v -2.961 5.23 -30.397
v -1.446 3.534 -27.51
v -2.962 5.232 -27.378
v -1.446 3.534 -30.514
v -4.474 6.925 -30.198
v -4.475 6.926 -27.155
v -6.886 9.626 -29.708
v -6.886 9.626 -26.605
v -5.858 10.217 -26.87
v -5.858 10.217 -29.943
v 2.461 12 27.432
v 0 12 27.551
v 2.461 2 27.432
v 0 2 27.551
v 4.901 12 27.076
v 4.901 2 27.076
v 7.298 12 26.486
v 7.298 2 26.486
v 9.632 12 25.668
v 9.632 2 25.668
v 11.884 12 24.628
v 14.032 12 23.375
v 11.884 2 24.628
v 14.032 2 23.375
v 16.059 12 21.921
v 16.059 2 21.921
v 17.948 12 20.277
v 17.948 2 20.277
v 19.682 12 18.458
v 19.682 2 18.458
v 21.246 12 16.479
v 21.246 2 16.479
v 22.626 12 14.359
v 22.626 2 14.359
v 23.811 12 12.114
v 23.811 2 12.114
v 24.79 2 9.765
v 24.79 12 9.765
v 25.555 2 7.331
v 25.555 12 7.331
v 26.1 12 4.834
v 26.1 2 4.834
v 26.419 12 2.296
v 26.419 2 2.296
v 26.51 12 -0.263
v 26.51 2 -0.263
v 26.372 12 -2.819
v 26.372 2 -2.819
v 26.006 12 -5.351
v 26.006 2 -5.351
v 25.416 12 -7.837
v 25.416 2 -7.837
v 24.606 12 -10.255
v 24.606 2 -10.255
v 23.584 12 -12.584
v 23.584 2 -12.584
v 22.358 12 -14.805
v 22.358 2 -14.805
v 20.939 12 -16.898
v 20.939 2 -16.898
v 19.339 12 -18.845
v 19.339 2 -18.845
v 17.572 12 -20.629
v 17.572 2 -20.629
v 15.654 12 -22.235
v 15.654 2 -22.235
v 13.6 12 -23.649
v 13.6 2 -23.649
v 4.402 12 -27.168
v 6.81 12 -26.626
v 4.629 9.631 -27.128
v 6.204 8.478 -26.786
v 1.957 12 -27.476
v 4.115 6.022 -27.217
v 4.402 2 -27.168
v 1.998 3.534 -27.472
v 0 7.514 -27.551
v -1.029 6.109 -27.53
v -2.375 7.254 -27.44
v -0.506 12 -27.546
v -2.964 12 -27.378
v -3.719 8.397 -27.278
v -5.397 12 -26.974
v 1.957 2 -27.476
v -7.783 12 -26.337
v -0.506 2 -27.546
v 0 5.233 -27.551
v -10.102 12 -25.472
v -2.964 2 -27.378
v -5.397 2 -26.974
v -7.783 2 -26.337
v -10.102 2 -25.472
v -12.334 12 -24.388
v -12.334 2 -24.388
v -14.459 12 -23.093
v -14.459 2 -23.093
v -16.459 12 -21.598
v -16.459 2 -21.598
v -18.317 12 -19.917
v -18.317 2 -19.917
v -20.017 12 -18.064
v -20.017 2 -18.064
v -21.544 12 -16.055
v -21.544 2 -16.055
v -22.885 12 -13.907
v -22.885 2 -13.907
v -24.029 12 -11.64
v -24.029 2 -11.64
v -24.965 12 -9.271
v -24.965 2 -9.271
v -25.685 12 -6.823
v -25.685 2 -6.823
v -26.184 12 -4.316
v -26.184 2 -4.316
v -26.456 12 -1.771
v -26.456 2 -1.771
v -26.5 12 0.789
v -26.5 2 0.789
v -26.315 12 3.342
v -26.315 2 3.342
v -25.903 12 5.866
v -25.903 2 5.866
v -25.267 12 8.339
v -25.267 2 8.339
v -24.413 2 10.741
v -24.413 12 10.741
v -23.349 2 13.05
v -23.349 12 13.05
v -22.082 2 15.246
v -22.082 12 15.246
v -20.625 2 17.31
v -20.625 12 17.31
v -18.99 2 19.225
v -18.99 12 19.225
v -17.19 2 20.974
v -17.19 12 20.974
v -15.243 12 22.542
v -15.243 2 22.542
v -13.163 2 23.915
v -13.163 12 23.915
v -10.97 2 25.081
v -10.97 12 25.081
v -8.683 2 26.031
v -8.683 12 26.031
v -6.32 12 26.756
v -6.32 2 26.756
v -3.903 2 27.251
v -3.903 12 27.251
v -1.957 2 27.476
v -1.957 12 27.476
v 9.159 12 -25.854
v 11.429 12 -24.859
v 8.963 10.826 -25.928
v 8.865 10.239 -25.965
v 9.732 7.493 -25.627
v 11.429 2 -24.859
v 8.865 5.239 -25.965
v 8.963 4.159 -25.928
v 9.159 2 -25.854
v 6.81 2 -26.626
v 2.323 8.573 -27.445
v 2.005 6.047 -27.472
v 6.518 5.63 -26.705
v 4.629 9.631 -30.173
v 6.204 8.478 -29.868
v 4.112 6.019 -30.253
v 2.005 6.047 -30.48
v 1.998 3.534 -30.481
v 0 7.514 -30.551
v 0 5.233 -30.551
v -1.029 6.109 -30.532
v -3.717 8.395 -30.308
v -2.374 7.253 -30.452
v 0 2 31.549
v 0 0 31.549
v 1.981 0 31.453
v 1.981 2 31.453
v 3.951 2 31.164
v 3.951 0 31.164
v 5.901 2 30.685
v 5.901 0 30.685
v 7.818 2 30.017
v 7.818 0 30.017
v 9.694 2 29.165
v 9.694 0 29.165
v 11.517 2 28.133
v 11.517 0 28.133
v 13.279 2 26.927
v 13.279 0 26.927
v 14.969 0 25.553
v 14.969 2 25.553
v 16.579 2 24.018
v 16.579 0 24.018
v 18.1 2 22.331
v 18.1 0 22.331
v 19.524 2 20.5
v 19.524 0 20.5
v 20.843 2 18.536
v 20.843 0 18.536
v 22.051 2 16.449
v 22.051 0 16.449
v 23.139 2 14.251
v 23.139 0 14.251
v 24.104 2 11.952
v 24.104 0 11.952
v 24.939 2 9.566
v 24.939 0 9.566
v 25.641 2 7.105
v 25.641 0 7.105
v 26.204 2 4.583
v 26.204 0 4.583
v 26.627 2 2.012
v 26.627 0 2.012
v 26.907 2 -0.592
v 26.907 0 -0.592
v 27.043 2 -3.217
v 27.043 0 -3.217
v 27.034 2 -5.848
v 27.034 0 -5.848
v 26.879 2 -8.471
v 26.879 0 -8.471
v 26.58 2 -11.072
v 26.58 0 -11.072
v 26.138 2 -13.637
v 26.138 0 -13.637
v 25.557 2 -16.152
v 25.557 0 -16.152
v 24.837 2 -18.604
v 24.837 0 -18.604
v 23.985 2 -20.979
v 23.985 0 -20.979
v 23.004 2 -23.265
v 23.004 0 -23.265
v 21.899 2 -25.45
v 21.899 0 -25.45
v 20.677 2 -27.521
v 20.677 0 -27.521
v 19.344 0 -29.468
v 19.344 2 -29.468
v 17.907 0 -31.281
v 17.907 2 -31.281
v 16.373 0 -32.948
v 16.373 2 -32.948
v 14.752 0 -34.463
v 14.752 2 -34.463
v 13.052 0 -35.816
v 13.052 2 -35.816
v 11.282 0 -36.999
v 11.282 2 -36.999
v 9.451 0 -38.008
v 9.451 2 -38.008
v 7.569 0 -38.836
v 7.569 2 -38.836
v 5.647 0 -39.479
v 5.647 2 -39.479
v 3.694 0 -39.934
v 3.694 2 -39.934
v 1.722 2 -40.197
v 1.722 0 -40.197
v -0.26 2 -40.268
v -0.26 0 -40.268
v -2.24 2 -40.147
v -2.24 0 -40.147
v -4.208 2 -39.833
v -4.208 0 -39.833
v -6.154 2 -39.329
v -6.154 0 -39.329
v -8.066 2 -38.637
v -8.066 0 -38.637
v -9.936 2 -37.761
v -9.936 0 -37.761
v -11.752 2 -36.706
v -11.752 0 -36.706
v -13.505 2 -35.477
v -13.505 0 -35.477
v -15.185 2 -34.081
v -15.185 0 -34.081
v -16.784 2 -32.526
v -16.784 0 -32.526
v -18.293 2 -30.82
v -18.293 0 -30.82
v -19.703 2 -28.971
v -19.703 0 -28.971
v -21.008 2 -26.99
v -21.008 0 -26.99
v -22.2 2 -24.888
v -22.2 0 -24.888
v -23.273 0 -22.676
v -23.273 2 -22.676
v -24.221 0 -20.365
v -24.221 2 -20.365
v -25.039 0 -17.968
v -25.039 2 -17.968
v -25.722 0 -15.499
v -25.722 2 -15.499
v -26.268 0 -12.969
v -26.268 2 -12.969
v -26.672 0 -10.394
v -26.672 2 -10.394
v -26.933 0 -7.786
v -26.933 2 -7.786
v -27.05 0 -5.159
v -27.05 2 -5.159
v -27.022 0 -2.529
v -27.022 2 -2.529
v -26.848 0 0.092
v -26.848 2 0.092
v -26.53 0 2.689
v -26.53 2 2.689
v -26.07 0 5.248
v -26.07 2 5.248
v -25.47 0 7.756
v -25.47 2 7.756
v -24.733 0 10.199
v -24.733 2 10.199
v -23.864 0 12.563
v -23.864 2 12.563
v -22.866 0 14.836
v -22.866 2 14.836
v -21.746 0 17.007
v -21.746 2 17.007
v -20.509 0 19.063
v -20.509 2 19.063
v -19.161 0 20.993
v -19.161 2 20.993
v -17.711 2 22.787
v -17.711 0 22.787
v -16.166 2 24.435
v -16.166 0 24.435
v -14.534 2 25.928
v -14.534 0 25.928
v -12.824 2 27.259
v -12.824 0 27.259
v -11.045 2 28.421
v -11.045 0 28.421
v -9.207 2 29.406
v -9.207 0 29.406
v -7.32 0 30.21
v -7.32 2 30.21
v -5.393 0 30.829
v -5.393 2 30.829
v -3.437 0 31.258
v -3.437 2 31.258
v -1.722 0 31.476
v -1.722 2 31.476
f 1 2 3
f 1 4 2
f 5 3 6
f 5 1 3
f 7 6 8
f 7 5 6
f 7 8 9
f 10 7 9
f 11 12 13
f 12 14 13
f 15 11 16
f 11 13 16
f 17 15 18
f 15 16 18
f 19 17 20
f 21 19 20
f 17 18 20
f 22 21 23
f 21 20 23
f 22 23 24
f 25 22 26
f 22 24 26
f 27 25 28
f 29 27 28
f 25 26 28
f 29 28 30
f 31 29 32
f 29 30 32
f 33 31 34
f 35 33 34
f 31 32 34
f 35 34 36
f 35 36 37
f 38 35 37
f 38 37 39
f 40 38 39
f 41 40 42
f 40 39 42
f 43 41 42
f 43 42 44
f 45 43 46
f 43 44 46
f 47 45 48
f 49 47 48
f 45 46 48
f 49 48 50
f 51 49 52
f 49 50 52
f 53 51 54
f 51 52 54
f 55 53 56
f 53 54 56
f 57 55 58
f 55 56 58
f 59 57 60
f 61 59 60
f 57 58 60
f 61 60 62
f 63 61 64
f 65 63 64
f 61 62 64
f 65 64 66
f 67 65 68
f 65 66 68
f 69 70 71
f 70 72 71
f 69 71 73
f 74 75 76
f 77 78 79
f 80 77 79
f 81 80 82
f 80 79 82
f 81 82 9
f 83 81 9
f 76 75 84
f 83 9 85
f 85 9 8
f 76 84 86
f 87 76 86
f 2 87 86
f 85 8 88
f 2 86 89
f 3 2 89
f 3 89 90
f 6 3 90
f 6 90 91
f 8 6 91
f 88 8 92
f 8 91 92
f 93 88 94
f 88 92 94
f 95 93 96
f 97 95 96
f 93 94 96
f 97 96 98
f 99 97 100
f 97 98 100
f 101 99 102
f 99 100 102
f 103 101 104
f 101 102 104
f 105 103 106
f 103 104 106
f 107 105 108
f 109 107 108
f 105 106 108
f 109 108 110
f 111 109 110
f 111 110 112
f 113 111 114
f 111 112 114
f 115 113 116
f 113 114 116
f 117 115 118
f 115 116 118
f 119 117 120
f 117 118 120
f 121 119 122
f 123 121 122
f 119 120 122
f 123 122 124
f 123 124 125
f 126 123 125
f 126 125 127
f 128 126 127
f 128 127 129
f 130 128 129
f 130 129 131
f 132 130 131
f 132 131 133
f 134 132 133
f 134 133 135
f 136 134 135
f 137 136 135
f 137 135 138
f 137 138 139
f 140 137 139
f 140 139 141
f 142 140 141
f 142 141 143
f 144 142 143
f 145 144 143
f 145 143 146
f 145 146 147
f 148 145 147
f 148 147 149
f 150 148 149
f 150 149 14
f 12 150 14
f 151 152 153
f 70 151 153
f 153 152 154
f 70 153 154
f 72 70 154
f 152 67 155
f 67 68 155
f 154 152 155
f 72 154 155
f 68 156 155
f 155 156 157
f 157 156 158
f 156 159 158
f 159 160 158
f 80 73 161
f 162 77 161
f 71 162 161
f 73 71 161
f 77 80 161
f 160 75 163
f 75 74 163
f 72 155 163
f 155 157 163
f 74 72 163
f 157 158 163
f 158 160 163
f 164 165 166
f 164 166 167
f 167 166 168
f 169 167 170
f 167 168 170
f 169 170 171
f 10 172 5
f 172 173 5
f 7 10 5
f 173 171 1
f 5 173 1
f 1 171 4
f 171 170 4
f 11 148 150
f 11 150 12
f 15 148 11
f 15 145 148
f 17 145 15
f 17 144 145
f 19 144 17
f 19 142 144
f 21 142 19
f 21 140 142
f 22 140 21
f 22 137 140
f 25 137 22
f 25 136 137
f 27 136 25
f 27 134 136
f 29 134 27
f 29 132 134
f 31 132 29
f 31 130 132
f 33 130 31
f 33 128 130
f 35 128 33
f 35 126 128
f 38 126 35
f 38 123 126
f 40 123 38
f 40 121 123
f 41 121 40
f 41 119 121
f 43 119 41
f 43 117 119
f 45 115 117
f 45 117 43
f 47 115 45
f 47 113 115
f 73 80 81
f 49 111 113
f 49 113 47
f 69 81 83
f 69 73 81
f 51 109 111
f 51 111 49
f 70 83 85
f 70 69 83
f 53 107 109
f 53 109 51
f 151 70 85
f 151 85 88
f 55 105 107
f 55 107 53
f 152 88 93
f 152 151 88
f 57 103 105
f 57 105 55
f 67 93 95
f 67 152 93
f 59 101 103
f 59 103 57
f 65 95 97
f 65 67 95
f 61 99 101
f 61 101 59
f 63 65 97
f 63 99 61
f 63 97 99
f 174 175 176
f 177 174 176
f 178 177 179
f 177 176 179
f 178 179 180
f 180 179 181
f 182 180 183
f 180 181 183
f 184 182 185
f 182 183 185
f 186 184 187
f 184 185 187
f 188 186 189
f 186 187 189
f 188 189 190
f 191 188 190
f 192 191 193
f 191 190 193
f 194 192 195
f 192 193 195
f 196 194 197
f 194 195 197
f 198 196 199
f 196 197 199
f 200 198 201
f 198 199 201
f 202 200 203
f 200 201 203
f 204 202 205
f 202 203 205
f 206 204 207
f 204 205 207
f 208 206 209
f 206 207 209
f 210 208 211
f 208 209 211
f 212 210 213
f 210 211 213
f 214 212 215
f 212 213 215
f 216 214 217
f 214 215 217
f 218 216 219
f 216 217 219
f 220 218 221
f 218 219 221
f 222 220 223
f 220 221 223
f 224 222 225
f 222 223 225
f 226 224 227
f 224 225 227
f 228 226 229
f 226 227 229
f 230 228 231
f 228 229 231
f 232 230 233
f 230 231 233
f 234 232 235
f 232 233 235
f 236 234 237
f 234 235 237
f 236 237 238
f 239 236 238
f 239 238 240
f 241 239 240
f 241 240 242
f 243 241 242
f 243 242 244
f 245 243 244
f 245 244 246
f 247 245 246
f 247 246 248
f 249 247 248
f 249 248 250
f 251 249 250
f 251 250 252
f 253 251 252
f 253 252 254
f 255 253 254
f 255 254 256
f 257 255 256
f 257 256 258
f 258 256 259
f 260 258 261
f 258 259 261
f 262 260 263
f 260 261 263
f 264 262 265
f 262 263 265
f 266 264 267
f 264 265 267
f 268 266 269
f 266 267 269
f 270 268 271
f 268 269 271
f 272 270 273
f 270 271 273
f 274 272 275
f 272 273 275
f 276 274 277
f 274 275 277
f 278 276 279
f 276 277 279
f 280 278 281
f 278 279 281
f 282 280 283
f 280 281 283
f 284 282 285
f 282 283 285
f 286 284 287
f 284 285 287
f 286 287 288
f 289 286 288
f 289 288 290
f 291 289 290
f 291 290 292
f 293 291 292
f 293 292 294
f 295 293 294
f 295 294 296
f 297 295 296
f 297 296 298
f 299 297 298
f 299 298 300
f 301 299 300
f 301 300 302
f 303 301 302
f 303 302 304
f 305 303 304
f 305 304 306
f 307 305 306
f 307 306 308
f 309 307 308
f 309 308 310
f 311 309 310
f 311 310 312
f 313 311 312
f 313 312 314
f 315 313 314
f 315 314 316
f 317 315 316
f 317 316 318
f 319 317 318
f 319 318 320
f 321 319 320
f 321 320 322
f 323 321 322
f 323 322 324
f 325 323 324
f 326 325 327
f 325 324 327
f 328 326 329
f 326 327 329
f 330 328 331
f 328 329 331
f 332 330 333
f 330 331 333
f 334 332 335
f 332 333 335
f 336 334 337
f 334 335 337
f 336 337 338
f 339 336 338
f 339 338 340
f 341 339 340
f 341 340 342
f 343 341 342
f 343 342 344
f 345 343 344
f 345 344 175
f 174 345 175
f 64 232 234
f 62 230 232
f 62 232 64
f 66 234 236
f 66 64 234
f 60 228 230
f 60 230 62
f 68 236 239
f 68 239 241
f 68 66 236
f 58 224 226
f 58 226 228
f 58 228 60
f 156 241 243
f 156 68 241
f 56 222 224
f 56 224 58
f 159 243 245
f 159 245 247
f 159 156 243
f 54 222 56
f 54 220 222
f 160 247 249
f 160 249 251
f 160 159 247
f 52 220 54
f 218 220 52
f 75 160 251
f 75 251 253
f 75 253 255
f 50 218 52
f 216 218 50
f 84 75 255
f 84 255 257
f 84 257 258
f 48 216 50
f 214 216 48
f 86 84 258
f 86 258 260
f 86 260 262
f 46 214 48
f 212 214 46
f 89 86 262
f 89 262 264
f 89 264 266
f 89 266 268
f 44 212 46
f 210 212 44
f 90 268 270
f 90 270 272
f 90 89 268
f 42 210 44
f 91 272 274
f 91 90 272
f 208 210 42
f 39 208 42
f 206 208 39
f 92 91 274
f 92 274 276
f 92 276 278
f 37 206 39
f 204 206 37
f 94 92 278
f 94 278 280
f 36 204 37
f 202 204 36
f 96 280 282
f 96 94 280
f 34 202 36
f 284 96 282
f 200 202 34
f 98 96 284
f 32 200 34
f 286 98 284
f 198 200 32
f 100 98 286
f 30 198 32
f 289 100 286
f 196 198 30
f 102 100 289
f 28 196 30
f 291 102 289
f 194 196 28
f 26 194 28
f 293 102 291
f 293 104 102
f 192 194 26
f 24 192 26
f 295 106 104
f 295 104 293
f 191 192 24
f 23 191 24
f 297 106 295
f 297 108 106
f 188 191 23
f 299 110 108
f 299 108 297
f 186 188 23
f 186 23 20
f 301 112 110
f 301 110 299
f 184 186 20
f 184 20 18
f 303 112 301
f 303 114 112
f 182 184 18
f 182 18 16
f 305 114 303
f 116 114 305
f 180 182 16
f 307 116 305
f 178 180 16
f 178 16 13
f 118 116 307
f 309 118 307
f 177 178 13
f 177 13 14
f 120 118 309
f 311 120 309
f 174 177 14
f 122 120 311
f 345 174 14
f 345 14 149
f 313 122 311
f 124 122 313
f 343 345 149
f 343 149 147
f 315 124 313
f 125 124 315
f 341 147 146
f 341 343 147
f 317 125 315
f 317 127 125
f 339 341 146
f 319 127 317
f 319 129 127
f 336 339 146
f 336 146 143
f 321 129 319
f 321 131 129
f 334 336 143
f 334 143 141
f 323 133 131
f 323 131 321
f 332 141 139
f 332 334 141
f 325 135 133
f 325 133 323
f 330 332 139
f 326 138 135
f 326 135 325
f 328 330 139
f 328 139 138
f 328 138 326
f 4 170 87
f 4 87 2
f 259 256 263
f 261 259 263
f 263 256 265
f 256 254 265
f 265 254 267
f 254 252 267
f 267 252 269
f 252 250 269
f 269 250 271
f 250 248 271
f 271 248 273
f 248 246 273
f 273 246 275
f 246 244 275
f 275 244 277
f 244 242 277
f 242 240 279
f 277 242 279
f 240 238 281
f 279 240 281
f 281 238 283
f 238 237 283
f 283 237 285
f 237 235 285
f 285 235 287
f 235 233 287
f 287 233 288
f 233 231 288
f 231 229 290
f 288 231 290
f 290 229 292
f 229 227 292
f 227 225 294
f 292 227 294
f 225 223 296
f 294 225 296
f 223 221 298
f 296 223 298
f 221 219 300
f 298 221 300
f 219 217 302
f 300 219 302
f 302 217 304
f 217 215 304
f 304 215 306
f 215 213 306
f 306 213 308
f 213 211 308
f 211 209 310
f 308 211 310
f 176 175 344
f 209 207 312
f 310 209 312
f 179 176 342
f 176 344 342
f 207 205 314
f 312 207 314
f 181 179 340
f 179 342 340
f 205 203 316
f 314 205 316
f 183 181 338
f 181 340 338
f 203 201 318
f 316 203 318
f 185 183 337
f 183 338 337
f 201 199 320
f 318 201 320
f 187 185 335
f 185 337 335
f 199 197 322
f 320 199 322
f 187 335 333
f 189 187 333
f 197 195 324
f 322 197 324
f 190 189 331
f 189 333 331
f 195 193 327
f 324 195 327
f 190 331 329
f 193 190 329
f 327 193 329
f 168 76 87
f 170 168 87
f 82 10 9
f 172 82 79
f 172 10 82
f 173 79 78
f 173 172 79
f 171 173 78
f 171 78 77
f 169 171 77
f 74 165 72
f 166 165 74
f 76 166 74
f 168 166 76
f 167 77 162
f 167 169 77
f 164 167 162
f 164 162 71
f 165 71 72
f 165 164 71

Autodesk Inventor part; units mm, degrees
ref_plane "YZ Plane" through (0, 0, 0) normal (1, 0, 0) x (0, 1, 0)
ref_plane "XZ Plane" through (0, 0, 0) normal (0, 1, 0) x (-1, 0, 0)
sketch "Sketch1" plane through (0, 0, 0) normal (0, 1, 0) x (-1, 0, 0)
  ellipse E0 centre (0, -4.3604) end of major axis (0, 31.5492) minor radius 27.0568
  ellipse E1 centre (0, -7.8745) end of major axis (0, -12.399) minor radius 3.571
  point P0 (0.4642, 6.4079)
extrude "Extrusion1" add sketch "Sketch1" along normal blind 2 contours E0 | E1
sketch "Sketch2" plane through (0, 2, 0) normal (0, 1, 0) x (1, 0, 0)
  ellipse E0 centre (0, 0) end of major axis (0, -27.5508) minor radius 26.511
  ellipse E1 centre (0, 4.3604) end of major axis (0, -31.5492) minor radius 27.0568 projected
  point P0 (8.845, -15.5857)
  point P1 (-8.845, -15.5857)
extrude "Extrusion2" add sketch "Sketch2" along normal blind 10 contours E0
ref_plane "Work Plane1" through (0, 0, -57) normal (0, 0, 1) x (1, 0, 0)
sketch "Sketch3" plane through (0, 0, -57) normal (0, 0, 1) x (1, 0, 0)
  line L0 (0, 7.5145) -> (2.0048, 6.0468)
  line L1 (2.0048, 6.0468) -> (4.6288, 9.6309)
  line L2 (4.6288, 9.6309) -> (6.2039, 8.4777)
  line L3 (6.2039, 8.4777) -> (1.9982, 3.5336)
  line L4 (1.9982, 3.5336) -> (0, 5.2333)
  line L5 (0, 5.2333) -> (-1.4459, 3.5336)
  line L6 (-1.4459, 3.5336) -> (-6.886, 9.626)
  line L7 (-6.886, 9.626) -> (-5.8582, 10.2166)
  line L8 (-5.8582, 10.2166) -> (-1.0292, 6.1088)
  line L9 (-1.0292, 6.1088) -> (0, 7.5145)
  point P0 (0, 0)
emboss "Emboss1" sketch "Sketch3" operation add depth 3 direction (0, 0, 1)
properties part number "Hat"
